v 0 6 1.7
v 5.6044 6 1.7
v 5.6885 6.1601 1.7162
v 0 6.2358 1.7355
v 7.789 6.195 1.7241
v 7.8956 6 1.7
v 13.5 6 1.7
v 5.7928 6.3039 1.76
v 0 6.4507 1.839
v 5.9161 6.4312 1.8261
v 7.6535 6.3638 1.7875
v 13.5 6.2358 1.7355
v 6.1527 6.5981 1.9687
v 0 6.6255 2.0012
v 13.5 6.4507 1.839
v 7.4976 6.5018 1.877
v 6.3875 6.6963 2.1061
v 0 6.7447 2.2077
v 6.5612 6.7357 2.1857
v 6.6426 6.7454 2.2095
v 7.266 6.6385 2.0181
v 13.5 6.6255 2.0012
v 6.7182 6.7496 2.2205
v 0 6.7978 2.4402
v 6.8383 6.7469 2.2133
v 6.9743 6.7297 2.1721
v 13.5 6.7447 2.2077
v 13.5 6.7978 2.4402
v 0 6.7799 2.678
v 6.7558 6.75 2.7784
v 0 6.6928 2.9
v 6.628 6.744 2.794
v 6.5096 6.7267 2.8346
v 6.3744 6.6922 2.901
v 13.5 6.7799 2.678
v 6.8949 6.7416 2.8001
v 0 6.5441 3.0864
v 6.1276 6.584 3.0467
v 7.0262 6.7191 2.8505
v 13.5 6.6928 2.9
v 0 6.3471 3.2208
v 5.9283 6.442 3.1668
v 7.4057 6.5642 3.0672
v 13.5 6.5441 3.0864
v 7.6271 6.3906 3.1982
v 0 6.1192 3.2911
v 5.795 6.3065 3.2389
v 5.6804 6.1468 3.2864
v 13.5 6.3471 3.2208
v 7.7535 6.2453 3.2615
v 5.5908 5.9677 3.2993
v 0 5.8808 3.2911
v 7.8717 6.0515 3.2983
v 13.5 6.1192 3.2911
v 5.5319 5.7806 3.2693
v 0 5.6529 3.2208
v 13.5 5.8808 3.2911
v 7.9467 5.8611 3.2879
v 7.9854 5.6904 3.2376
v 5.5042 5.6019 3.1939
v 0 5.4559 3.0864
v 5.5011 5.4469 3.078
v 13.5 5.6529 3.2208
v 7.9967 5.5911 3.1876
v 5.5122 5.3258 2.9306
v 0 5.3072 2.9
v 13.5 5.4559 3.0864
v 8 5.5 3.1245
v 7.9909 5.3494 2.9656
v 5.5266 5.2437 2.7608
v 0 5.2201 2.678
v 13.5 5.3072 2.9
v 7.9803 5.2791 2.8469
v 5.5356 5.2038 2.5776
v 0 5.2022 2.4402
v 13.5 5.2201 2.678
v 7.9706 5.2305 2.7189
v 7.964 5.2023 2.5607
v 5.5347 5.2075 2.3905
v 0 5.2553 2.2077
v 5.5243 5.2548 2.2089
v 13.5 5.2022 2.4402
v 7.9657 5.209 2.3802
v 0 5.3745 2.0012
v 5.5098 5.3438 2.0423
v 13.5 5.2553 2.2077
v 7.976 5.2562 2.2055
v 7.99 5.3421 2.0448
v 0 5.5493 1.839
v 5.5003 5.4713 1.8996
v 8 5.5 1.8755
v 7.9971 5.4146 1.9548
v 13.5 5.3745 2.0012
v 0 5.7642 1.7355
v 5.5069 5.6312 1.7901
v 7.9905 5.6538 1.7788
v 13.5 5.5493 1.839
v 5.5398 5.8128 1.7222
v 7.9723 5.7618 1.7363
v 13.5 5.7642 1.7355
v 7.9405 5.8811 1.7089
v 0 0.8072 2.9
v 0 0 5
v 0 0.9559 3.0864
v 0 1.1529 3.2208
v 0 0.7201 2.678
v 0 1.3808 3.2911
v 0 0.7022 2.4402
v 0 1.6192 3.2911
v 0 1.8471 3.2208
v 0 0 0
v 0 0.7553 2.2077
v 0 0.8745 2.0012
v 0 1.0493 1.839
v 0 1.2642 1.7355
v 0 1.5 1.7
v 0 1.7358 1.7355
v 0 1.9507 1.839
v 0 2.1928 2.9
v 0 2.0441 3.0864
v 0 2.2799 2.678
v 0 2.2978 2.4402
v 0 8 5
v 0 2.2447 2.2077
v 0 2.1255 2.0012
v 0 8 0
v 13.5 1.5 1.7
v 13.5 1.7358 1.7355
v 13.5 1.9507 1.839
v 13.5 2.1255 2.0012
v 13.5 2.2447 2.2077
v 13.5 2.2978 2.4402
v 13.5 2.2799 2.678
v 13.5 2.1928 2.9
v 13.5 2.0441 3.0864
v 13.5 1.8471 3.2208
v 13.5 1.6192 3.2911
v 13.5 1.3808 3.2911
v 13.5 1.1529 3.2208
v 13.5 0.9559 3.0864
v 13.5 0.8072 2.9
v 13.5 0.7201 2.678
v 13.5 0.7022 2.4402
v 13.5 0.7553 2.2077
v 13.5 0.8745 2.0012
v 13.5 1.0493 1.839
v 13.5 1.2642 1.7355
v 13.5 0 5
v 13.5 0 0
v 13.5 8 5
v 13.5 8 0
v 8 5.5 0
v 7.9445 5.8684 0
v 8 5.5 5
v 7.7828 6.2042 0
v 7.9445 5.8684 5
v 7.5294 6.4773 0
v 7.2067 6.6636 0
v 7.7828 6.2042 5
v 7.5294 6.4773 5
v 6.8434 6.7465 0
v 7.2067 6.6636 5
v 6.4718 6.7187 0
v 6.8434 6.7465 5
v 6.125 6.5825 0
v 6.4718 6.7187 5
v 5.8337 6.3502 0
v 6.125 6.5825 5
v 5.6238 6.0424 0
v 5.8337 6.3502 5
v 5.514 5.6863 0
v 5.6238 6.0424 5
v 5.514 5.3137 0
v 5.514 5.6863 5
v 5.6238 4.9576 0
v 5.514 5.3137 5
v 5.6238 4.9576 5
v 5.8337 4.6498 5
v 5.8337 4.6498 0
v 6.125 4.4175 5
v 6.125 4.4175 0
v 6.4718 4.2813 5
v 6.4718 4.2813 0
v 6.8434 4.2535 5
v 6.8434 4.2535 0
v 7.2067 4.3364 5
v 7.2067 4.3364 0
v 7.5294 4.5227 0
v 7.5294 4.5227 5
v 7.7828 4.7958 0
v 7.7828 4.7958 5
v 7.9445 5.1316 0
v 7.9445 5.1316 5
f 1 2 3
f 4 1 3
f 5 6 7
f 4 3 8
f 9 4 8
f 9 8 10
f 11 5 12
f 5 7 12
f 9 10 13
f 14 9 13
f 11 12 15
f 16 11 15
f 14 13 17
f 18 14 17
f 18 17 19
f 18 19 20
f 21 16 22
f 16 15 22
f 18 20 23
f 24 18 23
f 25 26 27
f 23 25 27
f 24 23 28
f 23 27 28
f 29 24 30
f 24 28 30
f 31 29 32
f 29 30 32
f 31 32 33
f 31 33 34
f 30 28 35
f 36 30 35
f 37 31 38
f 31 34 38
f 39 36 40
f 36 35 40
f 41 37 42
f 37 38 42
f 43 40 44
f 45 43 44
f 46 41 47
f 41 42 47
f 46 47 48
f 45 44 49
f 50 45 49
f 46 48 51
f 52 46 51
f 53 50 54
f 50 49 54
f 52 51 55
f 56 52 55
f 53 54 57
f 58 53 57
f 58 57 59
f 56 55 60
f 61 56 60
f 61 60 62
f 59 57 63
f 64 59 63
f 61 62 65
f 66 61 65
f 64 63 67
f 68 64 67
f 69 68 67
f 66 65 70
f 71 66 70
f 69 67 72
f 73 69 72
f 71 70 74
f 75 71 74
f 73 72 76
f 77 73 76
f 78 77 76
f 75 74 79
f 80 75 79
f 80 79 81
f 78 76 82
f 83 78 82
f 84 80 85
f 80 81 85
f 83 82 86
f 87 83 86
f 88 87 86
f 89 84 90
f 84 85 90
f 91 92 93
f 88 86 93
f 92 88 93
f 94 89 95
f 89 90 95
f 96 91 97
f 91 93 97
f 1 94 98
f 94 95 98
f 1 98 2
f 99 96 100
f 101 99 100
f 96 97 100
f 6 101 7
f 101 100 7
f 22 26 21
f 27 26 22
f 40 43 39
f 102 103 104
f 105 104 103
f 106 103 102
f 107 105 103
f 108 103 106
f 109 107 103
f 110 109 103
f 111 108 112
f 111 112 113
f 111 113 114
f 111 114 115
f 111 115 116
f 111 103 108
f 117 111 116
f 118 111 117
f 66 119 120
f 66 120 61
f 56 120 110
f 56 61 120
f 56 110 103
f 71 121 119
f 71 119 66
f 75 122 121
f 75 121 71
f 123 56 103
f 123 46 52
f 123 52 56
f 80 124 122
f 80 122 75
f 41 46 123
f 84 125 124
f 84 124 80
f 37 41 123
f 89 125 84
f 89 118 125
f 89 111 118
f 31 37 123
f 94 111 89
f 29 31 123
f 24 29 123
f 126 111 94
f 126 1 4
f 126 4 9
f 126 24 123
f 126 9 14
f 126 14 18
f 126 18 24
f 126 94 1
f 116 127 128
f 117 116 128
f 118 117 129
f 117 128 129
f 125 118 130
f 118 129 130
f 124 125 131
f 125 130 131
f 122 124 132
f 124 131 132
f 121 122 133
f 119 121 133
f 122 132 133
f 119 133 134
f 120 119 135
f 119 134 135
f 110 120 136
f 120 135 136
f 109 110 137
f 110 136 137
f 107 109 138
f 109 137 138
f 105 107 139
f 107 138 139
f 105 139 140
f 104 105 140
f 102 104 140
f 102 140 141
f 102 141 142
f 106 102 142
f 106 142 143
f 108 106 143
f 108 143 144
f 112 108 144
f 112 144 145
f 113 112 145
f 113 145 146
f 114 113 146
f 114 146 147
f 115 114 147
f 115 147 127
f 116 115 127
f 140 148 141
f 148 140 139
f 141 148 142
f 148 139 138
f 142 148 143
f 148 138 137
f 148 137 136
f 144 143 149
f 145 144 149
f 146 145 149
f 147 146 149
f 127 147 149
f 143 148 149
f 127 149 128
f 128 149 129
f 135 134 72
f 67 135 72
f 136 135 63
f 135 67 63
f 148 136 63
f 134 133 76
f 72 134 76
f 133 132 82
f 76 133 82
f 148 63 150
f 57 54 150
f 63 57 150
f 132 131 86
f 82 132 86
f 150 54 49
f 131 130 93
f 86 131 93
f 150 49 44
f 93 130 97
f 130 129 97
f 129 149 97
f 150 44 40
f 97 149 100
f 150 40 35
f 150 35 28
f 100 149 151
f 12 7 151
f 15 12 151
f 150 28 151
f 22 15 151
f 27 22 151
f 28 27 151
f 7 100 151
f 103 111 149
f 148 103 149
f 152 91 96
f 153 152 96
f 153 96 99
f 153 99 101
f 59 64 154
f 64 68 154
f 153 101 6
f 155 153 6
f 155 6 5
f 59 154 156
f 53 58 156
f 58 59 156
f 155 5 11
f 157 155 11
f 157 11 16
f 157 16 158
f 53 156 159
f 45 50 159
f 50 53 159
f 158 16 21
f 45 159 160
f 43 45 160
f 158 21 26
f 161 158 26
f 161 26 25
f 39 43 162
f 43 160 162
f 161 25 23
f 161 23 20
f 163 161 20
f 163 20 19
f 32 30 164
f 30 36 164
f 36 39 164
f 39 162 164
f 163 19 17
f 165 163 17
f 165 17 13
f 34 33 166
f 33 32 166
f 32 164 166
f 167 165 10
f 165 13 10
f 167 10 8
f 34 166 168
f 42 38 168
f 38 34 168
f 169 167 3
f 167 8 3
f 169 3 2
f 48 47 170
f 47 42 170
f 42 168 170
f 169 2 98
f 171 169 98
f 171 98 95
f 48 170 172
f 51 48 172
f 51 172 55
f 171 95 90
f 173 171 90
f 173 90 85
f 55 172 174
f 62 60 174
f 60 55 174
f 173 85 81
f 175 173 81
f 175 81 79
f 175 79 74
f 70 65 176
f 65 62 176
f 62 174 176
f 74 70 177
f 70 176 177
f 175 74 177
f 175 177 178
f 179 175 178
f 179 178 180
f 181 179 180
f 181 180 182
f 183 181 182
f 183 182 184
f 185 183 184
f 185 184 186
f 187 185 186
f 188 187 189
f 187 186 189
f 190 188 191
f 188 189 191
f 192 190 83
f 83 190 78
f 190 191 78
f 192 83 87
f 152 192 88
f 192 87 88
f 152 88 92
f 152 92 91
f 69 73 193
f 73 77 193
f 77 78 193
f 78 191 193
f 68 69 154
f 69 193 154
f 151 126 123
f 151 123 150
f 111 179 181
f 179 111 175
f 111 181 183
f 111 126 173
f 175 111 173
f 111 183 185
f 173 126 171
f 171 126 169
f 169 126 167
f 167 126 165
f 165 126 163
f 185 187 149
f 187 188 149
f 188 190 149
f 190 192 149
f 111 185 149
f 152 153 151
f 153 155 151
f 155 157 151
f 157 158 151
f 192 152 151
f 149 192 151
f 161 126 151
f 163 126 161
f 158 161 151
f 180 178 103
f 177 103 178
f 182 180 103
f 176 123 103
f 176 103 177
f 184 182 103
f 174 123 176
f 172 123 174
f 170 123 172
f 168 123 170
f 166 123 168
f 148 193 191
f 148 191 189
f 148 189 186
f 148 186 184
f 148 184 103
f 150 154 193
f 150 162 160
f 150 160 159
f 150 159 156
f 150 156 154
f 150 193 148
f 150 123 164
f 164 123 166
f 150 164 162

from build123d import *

# Parameters (mm, degrees)
ESQUISSE1_W                               = 13.5
ESQUISSE1_H                               = 8
BOSS_EXTRU_1_DEPTH                        = 5
TROU_POUR_TARAUDAGE_POUR_TROU_TARAUD_M2_D = 1.6
KERNLOCH_F_R_M3_GEWINDE1_D                = 2.5
KERNLOCH_F_R_M3_GEWINDE1_DEPTH            = 5
KERNLOCH_F_R_M3_GEWINDE1_TIP              = 0.751075774


with BuildPart() as part:
    # Esquisse1 → Boss.-Extru.1 (new body)
    with BuildSketch(Plane.XY):
        with Locations((6.75, 4)):
            Rectangle(ESQUISSE1_W, ESQUISSE1_H)
    extrude(amount=BOSS_EXTRU_1_DEPTH)

    # Trou pour taraudage pour trou taraudé M21 (through all)
    with Locations(Plane.ZY):
        with Locations((2.5, 6), (2.5, 1.5)):
            Hole(TROU_POUR_TARAUDAGE_POUR_TROU_TARAUD_M2_D / 2)

    # Kernloch für M3 Gewinde1
    with Locations(Plane(origin=(0, 0, 0), x_dir=(-1, 0, 0), z_dir=(0, 0, -1))):
        with Locations((-6.75, 5.5)):
            Hole(KERNLOCH_F_R_M3_GEWINDE1_D / 2, depth=KERNLOCH_F_R_M3_GEWINDE1_DEPTH)
            with Locations((0, 0, -(KERNLOCH_F_R_M3_GEWINDE1_DEPTH + KERNLOCH_F_R_M3_GEWINDE1_TIP / 2))):  # 118° drill point
                Cone(0, KERNLOCH_F_R_M3_GEWINDE1_D / 2, KERNLOCH_F_R_M3_GEWINDE1_TIP, mode=Mode.SUBTRACT)


solid = part.part
